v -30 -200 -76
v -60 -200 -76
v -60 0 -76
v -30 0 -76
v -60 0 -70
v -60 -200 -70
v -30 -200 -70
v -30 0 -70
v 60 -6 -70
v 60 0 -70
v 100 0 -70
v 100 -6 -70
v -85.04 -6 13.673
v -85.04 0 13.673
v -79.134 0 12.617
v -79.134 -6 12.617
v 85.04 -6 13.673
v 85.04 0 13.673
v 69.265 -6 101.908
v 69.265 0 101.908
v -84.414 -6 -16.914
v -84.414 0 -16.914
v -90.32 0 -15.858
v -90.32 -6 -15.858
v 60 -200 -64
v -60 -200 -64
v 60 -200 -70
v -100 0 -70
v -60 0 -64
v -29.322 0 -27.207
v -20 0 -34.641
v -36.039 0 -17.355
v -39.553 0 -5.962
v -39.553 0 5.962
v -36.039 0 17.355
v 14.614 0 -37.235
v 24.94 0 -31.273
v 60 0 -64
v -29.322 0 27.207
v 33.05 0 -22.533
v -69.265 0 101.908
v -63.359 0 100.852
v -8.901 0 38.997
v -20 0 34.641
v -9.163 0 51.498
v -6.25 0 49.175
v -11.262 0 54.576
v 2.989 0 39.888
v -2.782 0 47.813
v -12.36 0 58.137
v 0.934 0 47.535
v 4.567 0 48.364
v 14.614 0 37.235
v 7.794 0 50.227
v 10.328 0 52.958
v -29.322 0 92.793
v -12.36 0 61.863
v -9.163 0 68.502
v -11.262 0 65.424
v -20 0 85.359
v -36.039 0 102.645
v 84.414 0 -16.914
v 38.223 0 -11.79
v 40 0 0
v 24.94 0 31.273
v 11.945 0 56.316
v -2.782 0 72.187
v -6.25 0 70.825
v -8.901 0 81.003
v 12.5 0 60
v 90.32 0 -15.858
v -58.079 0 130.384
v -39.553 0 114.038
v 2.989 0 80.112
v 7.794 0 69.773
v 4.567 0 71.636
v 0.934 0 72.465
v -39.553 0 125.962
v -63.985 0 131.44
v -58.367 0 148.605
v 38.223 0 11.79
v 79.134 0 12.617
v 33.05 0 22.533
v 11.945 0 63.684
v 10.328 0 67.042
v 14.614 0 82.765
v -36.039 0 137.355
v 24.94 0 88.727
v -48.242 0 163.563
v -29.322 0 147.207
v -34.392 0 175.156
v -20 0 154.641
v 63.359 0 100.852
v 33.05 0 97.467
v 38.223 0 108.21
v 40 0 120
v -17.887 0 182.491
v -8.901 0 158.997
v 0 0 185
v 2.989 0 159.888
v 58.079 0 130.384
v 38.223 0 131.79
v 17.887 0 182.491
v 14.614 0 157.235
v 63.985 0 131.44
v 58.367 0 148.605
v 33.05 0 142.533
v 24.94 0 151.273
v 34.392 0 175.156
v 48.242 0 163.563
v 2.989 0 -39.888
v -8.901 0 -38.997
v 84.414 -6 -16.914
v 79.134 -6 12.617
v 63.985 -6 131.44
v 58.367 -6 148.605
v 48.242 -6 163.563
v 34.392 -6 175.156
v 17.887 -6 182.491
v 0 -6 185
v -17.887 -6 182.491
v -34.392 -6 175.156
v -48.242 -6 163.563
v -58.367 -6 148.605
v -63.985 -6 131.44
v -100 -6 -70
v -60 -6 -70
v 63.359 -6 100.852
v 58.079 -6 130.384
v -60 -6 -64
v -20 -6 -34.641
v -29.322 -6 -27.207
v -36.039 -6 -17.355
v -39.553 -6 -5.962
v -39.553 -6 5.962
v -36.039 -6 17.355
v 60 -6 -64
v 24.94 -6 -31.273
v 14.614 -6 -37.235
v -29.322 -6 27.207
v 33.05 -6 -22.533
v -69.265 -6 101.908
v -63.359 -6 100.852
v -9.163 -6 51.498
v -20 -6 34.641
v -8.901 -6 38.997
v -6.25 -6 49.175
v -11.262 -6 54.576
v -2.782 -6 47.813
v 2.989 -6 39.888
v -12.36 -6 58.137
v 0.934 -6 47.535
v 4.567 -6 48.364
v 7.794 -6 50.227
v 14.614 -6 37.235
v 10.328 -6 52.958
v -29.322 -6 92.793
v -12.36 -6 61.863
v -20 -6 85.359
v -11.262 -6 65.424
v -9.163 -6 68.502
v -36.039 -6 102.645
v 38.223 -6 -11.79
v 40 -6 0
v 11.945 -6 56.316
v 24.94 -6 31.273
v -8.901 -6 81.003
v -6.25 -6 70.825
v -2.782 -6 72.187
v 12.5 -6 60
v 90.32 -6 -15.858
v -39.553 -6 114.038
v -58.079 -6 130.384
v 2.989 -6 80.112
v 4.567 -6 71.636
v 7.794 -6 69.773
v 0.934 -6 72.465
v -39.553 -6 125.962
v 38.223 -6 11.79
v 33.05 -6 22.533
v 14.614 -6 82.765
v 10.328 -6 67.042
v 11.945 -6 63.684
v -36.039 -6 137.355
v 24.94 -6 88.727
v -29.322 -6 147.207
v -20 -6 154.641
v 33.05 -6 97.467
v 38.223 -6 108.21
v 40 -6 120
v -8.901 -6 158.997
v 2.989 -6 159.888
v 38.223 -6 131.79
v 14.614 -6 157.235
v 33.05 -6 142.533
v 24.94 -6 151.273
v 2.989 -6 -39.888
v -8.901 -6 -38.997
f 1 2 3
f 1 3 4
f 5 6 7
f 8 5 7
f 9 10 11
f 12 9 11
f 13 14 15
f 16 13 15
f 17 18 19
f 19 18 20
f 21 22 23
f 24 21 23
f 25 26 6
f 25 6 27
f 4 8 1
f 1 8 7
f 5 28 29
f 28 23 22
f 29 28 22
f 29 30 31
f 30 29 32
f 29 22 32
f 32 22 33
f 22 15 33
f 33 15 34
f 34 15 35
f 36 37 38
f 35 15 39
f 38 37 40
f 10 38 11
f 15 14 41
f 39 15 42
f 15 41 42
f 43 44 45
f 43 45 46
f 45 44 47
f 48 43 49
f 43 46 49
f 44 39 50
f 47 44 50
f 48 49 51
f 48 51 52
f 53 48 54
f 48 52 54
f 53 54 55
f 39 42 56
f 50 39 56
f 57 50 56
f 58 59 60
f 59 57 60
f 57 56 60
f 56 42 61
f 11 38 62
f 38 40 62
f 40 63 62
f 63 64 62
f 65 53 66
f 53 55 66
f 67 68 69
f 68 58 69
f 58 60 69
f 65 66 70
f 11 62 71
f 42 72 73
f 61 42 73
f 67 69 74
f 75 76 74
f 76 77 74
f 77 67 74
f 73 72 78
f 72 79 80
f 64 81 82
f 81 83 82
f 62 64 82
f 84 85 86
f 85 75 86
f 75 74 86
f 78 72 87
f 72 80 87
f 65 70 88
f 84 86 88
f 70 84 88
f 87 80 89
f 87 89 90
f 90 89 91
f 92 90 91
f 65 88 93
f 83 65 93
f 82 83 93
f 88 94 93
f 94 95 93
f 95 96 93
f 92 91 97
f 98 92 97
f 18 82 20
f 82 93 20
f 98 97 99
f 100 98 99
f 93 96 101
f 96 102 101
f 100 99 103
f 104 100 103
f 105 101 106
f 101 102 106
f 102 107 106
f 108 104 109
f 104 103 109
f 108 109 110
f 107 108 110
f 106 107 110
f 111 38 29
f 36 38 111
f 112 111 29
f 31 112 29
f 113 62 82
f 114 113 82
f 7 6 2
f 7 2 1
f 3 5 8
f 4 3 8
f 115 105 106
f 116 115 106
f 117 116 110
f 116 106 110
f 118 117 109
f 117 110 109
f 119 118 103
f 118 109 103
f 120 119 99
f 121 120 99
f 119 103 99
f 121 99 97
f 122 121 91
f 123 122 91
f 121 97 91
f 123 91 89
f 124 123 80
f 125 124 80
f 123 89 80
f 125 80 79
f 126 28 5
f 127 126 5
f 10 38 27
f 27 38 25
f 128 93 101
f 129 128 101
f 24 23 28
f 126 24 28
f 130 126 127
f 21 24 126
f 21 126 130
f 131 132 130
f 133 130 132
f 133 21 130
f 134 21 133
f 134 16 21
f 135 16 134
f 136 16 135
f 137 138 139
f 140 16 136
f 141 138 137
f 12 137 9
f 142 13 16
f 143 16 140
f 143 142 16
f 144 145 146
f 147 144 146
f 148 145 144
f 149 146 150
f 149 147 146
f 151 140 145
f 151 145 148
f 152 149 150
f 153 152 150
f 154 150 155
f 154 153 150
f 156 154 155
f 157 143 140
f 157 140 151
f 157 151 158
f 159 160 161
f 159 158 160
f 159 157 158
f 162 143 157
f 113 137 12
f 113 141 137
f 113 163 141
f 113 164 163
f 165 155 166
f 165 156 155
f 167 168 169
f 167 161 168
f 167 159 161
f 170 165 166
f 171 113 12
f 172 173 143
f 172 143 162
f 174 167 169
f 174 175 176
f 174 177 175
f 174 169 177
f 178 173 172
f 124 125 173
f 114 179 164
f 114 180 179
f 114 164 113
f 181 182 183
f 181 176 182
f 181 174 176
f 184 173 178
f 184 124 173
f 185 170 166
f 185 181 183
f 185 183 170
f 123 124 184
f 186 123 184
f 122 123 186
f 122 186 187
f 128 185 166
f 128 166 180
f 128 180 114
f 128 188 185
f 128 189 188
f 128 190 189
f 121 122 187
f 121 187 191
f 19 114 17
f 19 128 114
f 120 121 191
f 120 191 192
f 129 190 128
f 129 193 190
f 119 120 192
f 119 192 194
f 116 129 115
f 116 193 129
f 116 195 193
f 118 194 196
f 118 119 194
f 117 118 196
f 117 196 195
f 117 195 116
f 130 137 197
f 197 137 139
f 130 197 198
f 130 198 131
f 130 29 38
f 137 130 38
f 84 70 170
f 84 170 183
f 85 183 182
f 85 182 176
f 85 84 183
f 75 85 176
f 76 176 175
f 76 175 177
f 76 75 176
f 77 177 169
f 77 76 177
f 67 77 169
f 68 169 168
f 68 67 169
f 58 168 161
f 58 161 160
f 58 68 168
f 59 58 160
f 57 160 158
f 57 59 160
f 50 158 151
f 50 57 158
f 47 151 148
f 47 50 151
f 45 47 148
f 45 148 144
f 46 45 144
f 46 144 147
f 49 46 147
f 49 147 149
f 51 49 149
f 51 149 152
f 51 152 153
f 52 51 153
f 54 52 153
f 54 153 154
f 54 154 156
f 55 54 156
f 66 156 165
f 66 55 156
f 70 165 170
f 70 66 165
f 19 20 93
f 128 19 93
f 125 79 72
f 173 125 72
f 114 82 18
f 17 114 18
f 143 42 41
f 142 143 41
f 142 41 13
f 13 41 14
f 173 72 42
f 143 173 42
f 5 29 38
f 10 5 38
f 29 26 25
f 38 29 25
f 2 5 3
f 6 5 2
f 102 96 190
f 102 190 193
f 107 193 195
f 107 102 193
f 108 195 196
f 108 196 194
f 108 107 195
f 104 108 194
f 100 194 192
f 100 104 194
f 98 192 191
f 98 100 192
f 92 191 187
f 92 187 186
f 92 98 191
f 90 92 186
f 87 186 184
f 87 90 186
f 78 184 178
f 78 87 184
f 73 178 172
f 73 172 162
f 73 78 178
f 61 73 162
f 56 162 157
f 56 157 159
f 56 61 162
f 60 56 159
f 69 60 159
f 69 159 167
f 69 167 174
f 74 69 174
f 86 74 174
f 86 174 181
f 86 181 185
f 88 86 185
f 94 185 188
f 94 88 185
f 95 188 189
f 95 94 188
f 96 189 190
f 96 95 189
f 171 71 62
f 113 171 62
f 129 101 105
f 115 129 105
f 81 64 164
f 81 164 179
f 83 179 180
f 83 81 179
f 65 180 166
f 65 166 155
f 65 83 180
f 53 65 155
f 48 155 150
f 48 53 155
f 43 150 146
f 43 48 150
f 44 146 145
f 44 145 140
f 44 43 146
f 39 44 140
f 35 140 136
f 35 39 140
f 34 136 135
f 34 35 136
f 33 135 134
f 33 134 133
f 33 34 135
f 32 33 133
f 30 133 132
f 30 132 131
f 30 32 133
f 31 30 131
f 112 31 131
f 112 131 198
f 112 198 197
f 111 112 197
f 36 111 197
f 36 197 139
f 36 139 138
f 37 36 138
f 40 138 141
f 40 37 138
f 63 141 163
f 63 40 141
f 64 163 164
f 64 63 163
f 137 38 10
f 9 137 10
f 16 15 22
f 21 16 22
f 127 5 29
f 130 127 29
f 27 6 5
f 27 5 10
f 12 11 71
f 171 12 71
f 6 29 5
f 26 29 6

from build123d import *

# Parameters (mm, degrees)
F0_R     = 40
F0_R_2   = 12.5
F1_DEPTH = 6
F2_W     = 120
F2_H     = 200
F3_DEPTH = 6
F4_W     = 30
F4_H     = 200
F5_DEPTH = 6


with BuildPart() as f1:
    # F0 (on Front) → F1 (new body)
    with BuildSketch(Plane.XZ):
        with BuildLine():
            Line((-90.32026, -15.858494), (-100, -70))
            Line((-100, -70), (-60, -70))
            Line((-60, -70), (-60, -64))
            Line((-60, -64), (0, -64))
            Line((0, -64), (60, -64))
            Line((60, -64), (60, -70))
            Line((60, -70), (100, -70))
            Line((100, -70), (90.32026, -15.858494))
            Line((90.32026, -15.858494), (84.413914, -16.914466))
            Line((84.413914, -16.914466), (79.134056, 12.617264))
            Line((79.134056, 12.617264), (85.040402, 13.673236))
            Line((85.040402, 13.673236), (69.265274, 101.907962))
            Line((69.265274, 101.907962), (63.358928, 100.851991))
            Line((63.358928, 100.851991), (58.07907, 130.383721))
            Line((58.07907, 130.383721), (63.985416, 131.439693))
            ThreePointArc((63.985416, 131.439693), (0, 185), (-63.985416, 131.439693))
            Line((-63.985416, 131.439693), (-58.07907, 130.383721))
            Line((-58.07907, 130.383721), (-63.358928, 100.851991))
            Line((-63.358928, 100.851991), (-69.265274, 101.907962))
            Line((-69.265274, 101.907962), (-85.040402, 13.673236))
            Line((-85.040402, 13.673236), (-79.134056, 12.617264))
            Line((-79.134056, 12.617264), (-84.413914, -16.914466))
            Line((-84.413914, -16.914466), (-90.32026, -15.858494))
        make_face()
        Circle(F0_R, mode=Mode.SUBTRACT)
        with Locations((0, 60)):
            Circle(F0_R_2, mode=Mode.SUBTRACT)
        with Locations((0, 120)):
            Circle(F0_R, mode=Mode.SUBTRACT)
    extrude(amount=F1_DEPTH)


with BuildPart() as f3:
    # F2 (on face) → F3 (new body)
    with BuildSketch(Plane(origin=(0, 0, -64), x_dir=(1, 0, 0), z_dir=(0, 0, -1))):
        with Locations((0, 100)):
            Rectangle(F2_W, F2_H)
    extrude(amount=F3_DEPTH)


with BuildPart() as f5:
    # F4 (on face) → F5 (new body)
    with BuildSketch(Plane(origin=(0, 0, -70), x_dir=(1, 0, 0), z_dir=(0, 0, -1))):
        with Locations((-45, 100)):
            Rectangle(F4_W, F4_H)
    extrude(amount=F5_DEPTH)


solid = Compound([f1.part, f3.part, f5.part])
